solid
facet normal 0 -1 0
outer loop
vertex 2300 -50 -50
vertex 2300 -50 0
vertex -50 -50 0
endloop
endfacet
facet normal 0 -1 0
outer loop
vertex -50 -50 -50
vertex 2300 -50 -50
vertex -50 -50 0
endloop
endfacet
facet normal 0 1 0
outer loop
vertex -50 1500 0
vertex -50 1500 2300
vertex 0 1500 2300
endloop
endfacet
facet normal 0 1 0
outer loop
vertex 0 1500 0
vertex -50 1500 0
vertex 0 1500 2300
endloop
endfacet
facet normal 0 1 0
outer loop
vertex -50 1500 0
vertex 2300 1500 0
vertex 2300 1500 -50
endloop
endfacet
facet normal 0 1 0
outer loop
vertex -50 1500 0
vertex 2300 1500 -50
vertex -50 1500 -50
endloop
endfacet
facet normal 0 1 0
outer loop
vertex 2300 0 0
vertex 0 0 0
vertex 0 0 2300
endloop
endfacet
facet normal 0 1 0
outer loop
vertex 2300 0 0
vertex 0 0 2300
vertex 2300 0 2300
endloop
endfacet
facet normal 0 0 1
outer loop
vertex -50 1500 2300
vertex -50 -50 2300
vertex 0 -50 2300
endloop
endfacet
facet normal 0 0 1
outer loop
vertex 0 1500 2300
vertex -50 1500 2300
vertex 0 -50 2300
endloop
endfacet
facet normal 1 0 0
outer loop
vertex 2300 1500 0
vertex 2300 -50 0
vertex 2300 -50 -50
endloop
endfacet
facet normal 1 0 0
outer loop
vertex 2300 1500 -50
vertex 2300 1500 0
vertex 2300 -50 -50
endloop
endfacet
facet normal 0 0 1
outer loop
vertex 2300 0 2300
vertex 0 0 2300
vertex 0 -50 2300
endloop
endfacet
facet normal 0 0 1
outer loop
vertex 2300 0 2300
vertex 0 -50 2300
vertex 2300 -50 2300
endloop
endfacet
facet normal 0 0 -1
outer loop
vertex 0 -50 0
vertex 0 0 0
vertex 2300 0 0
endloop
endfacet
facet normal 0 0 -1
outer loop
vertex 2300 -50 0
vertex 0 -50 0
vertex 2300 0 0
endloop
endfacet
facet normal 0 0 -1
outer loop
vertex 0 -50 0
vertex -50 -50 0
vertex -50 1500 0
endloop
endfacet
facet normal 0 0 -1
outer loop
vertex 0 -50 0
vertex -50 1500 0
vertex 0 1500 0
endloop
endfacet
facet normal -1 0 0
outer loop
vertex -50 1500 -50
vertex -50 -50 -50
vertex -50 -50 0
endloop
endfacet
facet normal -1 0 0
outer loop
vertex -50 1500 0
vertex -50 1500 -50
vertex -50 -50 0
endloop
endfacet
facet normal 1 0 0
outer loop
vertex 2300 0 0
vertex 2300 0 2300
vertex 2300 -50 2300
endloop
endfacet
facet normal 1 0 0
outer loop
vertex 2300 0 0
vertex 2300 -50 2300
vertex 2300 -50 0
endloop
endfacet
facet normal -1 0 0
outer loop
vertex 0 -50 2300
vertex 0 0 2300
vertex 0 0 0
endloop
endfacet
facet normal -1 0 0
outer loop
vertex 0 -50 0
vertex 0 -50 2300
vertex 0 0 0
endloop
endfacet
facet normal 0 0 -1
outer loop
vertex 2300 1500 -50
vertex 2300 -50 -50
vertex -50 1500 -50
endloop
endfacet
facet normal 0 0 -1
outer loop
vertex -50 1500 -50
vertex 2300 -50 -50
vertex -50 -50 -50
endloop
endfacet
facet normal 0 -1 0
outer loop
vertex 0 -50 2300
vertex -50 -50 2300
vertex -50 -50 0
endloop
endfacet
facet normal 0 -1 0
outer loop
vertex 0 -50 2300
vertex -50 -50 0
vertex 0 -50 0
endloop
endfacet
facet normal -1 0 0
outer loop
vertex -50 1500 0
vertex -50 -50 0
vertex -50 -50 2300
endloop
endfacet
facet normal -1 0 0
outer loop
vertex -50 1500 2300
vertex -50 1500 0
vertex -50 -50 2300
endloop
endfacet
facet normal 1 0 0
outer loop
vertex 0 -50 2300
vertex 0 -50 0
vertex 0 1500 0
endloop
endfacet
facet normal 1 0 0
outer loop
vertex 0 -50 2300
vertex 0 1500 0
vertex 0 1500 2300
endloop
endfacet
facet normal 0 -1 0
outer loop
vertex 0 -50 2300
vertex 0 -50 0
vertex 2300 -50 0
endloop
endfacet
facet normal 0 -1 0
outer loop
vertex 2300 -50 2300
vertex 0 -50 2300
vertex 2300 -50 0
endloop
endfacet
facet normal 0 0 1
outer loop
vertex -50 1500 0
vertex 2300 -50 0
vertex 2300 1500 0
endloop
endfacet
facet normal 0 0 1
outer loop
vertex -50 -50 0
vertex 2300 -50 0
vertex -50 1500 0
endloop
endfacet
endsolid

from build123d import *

# Parameters (mm, degrees)
SKETCH1_W           = 2300
SKETCH1_H           = 2300
BOSS_EXTRUDE1_DEPTH = 50
BOSS_EXTRUDE2_DEPTH = 1550
SKETCH3_W           = 50
SKETCH3_H           = 2300
BOSS_EXTRUDE3_DEPTH = 1550


with BuildPart() as part:
    # Sketch1 → Boss-Extrude1 (new body)
    with BuildSketch(Plane(origin=(0, 0, 0), x_dir=(1, 0, 0), z_dir=(0, 1, 0))):
        with Locations((1150, -1150)):
            Rectangle(SKETCH1_W, SKETCH1_H)
    extrude(amount=-BOSS_EXTRUDE1_DEPTH)


with BuildPart() as body_2:
    # Sketch2 → Boss-Extrude2 (new body)
    with BuildSketch(Plane.XZ.offset(50)):
        Polygon((0, 0), (2300, 0), (2300, -50), (-50, -50), (-50, 0), align=None)
    extrude(amount=-BOSS_EXTRUDE2_DEPTH)


with BuildPart() as body_3:
    # Sketch3 → Boss-Extrude3 (new body)
    with BuildSketch(Plane.XZ.offset(50)):
        with Locations((-25, 1150)):
            Rectangle(SKETCH3_W, SKETCH3_H)
    extrude(amount=-BOSS_EXTRUDE3_DEPTH)


solid = Compound([part.part, body_2.part, body_3.part])
